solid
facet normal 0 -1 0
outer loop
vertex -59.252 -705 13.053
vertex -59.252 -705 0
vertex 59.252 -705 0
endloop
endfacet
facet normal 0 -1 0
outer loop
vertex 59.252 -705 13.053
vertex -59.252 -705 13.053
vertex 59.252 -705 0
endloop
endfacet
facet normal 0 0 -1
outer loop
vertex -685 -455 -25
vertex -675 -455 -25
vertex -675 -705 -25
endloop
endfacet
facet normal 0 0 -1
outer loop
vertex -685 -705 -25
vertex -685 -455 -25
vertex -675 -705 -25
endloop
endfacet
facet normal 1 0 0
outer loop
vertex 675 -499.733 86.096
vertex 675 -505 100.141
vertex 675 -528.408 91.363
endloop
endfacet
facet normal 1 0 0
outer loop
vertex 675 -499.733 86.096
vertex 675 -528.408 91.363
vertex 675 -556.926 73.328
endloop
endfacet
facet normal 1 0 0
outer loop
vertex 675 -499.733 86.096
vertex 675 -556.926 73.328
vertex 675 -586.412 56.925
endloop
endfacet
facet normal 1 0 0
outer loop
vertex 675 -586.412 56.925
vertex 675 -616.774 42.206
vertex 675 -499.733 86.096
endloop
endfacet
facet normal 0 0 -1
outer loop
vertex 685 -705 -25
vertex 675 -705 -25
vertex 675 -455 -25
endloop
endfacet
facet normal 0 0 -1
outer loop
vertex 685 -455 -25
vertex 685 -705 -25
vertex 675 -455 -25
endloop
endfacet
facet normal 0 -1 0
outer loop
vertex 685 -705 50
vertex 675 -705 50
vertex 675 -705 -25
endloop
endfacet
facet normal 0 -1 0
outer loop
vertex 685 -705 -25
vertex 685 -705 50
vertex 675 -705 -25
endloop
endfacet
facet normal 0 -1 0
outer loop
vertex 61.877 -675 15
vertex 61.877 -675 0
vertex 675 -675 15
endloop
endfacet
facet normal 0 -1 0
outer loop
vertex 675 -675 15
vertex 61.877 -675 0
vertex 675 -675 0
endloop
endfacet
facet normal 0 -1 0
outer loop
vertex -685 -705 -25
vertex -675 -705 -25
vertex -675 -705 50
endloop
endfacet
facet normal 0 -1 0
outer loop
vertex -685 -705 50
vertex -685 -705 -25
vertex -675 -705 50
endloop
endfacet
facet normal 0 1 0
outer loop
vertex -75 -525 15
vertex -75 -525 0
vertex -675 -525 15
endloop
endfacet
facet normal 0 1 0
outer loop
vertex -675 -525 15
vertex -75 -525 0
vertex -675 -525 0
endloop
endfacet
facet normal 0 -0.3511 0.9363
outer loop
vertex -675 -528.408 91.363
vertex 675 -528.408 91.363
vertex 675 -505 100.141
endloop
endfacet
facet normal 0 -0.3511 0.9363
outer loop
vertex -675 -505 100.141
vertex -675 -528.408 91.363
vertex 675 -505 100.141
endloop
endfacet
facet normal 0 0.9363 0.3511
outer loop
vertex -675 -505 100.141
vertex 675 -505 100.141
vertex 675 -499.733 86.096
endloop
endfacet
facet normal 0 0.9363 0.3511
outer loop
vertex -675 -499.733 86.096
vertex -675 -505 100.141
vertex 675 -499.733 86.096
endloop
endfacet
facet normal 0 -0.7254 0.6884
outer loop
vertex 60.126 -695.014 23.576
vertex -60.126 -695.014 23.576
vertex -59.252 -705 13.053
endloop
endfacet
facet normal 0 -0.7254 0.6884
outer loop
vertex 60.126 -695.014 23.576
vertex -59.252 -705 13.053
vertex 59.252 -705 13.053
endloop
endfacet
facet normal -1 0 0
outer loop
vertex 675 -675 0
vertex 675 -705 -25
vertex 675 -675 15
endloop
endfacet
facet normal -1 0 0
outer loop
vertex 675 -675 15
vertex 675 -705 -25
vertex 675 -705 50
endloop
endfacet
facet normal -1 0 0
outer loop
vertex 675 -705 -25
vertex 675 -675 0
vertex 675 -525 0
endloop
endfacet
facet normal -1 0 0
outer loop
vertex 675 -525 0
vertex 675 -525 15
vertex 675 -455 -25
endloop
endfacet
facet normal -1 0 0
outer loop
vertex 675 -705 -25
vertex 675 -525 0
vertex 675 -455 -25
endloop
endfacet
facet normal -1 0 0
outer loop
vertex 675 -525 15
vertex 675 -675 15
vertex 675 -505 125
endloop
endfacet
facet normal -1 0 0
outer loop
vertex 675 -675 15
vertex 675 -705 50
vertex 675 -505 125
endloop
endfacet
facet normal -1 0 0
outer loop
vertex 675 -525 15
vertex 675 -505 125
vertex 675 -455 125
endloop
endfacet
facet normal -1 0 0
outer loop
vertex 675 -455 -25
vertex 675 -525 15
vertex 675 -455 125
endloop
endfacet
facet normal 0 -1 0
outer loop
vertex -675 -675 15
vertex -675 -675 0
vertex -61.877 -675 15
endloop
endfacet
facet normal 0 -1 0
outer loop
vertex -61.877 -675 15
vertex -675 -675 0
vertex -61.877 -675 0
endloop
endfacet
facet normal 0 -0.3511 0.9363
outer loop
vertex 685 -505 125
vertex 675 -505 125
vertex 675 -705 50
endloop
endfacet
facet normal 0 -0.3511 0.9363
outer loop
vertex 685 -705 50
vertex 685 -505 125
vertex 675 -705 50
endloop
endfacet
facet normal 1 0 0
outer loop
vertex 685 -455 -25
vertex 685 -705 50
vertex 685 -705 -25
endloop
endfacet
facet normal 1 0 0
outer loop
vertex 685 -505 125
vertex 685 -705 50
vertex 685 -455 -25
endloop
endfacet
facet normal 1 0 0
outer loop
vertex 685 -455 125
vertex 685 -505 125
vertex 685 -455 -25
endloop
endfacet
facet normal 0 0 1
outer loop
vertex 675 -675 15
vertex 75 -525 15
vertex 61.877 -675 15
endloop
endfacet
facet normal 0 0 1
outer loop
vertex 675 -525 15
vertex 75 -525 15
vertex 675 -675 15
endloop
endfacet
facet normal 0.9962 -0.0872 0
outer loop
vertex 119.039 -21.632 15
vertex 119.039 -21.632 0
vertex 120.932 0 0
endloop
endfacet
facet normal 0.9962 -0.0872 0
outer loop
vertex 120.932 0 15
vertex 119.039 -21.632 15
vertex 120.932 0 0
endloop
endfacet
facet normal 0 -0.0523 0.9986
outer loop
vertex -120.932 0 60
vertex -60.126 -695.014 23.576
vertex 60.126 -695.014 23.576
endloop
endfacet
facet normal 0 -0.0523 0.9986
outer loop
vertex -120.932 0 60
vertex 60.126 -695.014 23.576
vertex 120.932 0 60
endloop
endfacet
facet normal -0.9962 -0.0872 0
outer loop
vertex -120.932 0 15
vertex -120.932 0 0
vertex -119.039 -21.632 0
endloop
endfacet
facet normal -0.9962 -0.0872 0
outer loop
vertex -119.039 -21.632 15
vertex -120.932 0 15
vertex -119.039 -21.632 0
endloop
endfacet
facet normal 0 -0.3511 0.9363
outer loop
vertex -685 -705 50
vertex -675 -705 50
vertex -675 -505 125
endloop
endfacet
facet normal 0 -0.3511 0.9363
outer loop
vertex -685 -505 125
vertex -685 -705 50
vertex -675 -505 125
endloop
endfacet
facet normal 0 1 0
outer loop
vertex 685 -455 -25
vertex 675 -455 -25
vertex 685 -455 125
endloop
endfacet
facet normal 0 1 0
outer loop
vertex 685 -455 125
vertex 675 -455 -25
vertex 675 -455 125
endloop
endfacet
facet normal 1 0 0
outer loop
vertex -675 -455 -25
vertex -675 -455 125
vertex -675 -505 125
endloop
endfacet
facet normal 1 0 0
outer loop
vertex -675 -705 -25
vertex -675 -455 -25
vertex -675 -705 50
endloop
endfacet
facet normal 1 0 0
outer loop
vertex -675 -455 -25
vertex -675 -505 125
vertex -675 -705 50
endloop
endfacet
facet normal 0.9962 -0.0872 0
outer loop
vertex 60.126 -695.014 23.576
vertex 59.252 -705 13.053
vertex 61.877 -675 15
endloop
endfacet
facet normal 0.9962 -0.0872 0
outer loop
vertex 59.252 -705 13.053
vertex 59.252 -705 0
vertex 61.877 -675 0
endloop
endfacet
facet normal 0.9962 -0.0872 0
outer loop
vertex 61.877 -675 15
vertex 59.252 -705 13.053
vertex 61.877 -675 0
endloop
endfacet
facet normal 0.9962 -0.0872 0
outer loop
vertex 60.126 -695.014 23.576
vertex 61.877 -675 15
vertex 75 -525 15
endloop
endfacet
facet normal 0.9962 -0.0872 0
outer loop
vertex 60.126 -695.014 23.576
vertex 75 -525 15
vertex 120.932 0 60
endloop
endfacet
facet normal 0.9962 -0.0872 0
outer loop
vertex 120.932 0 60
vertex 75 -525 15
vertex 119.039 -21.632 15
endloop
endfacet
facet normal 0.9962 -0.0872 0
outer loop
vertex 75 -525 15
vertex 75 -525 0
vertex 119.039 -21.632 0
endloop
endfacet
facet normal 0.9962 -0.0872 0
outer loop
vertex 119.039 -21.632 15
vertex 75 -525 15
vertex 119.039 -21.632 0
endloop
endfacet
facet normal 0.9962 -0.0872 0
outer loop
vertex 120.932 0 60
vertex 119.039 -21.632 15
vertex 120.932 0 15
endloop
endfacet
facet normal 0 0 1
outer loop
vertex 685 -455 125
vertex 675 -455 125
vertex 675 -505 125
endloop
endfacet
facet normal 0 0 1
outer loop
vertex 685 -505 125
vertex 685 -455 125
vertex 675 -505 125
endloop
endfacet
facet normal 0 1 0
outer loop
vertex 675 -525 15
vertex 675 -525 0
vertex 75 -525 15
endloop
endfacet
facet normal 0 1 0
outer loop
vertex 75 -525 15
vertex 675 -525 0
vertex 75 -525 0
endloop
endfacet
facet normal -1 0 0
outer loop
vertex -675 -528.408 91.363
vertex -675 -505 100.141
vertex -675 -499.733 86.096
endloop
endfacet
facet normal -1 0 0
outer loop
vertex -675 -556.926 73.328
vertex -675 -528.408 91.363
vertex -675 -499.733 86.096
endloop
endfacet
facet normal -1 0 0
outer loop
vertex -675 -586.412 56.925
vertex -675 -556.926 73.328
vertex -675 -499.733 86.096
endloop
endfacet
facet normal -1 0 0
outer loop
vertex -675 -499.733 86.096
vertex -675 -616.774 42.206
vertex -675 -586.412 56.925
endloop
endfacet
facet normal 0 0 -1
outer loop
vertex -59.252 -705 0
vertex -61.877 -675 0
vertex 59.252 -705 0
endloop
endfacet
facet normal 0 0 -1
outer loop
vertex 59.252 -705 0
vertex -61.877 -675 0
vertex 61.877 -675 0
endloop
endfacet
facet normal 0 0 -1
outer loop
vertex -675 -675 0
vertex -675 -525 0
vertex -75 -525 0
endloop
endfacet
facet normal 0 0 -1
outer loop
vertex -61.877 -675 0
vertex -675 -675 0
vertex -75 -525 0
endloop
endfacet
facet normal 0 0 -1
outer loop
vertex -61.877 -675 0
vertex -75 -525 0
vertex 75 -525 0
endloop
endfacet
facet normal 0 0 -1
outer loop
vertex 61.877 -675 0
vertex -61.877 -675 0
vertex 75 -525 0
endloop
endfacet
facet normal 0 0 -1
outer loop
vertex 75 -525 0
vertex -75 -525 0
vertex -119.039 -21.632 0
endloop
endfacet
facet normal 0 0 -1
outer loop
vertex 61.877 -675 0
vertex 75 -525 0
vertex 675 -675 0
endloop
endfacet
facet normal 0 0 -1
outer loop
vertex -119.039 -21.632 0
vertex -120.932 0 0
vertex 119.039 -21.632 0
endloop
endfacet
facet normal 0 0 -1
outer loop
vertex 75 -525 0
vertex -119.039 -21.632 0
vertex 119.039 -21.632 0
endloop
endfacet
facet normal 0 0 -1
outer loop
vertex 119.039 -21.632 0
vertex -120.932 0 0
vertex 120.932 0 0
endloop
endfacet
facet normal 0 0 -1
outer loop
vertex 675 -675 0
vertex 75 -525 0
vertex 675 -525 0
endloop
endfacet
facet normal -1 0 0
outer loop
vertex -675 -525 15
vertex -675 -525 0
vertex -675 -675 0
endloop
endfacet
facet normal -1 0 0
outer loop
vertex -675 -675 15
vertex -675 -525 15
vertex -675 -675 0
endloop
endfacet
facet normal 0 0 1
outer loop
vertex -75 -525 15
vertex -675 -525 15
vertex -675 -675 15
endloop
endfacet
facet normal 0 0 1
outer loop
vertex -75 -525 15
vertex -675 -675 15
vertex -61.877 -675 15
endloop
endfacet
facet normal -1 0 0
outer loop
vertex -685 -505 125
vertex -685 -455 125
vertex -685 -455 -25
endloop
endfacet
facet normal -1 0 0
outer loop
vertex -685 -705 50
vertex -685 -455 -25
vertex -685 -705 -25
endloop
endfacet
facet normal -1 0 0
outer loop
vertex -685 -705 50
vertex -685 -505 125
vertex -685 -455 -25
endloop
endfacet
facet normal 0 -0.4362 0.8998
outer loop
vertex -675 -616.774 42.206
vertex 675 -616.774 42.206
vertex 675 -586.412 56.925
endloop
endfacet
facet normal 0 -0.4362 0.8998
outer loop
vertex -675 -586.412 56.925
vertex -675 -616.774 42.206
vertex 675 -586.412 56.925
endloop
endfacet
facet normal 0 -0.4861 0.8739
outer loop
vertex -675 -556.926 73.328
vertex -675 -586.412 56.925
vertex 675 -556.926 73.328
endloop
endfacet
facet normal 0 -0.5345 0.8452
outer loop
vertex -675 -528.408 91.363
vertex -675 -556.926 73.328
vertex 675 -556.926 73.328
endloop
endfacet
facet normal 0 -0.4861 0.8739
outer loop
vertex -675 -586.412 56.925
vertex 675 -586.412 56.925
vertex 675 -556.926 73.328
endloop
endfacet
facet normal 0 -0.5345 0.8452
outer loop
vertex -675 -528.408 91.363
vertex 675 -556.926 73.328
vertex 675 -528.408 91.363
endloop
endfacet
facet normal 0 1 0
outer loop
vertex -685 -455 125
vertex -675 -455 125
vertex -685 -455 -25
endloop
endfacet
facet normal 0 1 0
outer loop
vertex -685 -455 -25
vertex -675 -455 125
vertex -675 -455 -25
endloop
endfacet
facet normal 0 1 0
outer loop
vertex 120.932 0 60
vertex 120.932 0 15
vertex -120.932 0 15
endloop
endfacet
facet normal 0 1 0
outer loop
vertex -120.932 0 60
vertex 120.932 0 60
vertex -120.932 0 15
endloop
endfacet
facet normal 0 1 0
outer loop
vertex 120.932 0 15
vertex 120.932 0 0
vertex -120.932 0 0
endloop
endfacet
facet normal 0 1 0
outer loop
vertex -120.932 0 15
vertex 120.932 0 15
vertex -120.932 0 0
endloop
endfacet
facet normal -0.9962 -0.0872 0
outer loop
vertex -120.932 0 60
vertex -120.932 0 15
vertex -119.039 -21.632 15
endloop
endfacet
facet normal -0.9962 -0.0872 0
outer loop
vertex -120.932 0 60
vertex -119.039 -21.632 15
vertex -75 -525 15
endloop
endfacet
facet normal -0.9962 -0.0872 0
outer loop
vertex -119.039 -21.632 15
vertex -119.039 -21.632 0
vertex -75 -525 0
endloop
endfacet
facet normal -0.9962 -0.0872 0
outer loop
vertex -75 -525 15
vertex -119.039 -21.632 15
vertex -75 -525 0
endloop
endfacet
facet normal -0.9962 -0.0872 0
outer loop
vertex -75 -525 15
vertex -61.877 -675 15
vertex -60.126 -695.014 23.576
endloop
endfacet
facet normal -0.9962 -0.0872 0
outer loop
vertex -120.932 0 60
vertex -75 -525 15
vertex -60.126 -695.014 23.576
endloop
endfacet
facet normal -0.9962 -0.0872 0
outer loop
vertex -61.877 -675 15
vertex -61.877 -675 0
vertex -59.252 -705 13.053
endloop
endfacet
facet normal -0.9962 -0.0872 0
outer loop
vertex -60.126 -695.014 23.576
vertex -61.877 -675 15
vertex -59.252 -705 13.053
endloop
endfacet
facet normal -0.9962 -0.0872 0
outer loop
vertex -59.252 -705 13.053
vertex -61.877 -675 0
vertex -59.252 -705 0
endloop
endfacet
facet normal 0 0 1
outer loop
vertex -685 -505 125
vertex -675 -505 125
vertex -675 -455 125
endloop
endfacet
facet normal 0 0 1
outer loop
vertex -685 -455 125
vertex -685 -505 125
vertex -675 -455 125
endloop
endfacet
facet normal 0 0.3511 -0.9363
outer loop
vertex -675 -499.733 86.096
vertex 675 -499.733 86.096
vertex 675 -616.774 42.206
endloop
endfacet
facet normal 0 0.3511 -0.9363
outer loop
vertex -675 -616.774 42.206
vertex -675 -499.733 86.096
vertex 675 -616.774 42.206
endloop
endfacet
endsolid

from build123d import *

# Parameters (mm, degrees)
F1_DEPTH       = 15
F2_W           = 150
F2_H           = 15
F3_DEPTH       = 10
F4_W           = 250
F4_H           = 75
F4_W_2         = 150
F4_H_2         = 15
F5_DEPTH       = 10
F7_DEPTH       = 45
F9_DEPTH       = 1350
F11_DEPTH      = 675
F11_DEPTH_BACK = 675
F12_SIZE       = 10


# Not quite as in the source:
# - an extrude ends at something that could not be found from the text; its depth is read off the source's solid


with BuildPart() as f1:
    # F0 (on Top) → F1 (new body)
    with BuildSketch(Plane.XY):
        Polygon((-61.8767004711, -675), (-75, -525), (-675, -525), (-675, -675), align=None)
        Polygon((0, -525), (0, 0), (-120.9315483511, 0), (-119.0390060495, -21.6318574922), (-75, -525), align=None)
        Polygon((120.9315483511, 0), (0, 0), (0, -525), (75, -525), (119.0390060495, -21.6318574922), align=None)
        Polygon((0, -705), (0, -525), (-75, -525), (-61.8767004711, -675), (-59.2520405653, -705), align=None)
        Polygon((75, -525), (0, -525), (0, -705), (59.2520405653, -705), (61.8767004711, -675), align=None)
        Polygon((675, -525), (75, -525), (61.8767004711, -675), (675, -675), align=None)
    extrude(amount=F1_DEPTH)

    # F2 (on face) → F3 (join)
    with BuildSketch(Plane.YZ.offset(675)):
        Polygon((-505, 125), (-705, 50), (-455, 50), (-455, 125), align=None)
        Polygon((-705, 50), (-705, 0), (-705, -25), (-455, -25), (-455, 50), align=None)
        with Locations((-600, 7.5)):
            Rectangle(F2_W, F2_H, mode=Mode.SUBTRACT)
        with Locations((-600, 7.5)):
            Rectangle(F2_W, F2_H)
    extrude(amount=F3_DEPTH)

    # F6 (on face) → F7 (join)
    with BuildSketch(Plane.XY.offset(15)):
        Polygon((120.9315483511, 0), (-120.9315483511, 0), (-59.2520405653, -705), (59.2520405653, -705), align=None)
    extrude(amount=F7_DEPTH)

    # F10 (on Right) → F11 (cut, two sides)
    with BuildSketch(Plane.YZ) as f11_sk:
        Polygon((-826.1129958937, 16.7052524484), (0, 60), (-829.8766534977, 88.5201176353), align=None)
    extrude(amount=F11_DEPTH, mode=Mode.SUBTRACT)
    extrude(f11_sk.sketch, amount=-F11_DEPTH_BACK, mode=Mode.SUBTRACT)

    # F12
    f12_edges = [f1.edges().sort_by_distance(p)[0] for p in [
        (0, -705, 23.052516),
    ]]
    chamfer(f12_edges, length=F12_SIZE)


with BuildPart() as f5:
    # F4 (on face) → F5 (new body)
    with BuildSketch(Plane(origin=(-675, 0, 0), x_dir=(0, -1, 0), z_dir=(-1, 0, 0))):
        Polygon((455, 125), (455, 50), (705, 50), (505, 125), align=None)
        with Locations((580, 12.5)):
            Rectangle(F4_W, F4_H)
        with Locations((600, 7.5)):
            Rectangle(F4_W_2, F4_H_2, mode=Mode.SUBTRACT)
        with Locations((600, 7.5)):
            Rectangle(F4_W_2, F4_H_2)
    extrude(amount=F5_DEPTH)


with BuildPart() as f9:
    # F8 (on face) → F9 (new body, through all)
    with BuildSketch(Plane(origin=(675, 0, 0), x_dir=(0, -1, 0), z_dir=(-1, 0, 0))):
        with BuildLine():
            Line((528.4082294392, 91.3629019553), (505, 100.140987995))
            Line((505, 100.140987995), (499.7331483762, 86.0960503315))
            Line((499.7331483762, 86.0960503315), (616.7742955723, 42.2056201329))
            ThreePointArc((616.7742955723, 42.2056201329), (571.5538504506, 64.9193893734), (528.4082294392, 91.3629019553))
        make_face()
    extrude(amount=F9_DEPTH)


solid = Compound([f1.part, f5.part, f9.part])
